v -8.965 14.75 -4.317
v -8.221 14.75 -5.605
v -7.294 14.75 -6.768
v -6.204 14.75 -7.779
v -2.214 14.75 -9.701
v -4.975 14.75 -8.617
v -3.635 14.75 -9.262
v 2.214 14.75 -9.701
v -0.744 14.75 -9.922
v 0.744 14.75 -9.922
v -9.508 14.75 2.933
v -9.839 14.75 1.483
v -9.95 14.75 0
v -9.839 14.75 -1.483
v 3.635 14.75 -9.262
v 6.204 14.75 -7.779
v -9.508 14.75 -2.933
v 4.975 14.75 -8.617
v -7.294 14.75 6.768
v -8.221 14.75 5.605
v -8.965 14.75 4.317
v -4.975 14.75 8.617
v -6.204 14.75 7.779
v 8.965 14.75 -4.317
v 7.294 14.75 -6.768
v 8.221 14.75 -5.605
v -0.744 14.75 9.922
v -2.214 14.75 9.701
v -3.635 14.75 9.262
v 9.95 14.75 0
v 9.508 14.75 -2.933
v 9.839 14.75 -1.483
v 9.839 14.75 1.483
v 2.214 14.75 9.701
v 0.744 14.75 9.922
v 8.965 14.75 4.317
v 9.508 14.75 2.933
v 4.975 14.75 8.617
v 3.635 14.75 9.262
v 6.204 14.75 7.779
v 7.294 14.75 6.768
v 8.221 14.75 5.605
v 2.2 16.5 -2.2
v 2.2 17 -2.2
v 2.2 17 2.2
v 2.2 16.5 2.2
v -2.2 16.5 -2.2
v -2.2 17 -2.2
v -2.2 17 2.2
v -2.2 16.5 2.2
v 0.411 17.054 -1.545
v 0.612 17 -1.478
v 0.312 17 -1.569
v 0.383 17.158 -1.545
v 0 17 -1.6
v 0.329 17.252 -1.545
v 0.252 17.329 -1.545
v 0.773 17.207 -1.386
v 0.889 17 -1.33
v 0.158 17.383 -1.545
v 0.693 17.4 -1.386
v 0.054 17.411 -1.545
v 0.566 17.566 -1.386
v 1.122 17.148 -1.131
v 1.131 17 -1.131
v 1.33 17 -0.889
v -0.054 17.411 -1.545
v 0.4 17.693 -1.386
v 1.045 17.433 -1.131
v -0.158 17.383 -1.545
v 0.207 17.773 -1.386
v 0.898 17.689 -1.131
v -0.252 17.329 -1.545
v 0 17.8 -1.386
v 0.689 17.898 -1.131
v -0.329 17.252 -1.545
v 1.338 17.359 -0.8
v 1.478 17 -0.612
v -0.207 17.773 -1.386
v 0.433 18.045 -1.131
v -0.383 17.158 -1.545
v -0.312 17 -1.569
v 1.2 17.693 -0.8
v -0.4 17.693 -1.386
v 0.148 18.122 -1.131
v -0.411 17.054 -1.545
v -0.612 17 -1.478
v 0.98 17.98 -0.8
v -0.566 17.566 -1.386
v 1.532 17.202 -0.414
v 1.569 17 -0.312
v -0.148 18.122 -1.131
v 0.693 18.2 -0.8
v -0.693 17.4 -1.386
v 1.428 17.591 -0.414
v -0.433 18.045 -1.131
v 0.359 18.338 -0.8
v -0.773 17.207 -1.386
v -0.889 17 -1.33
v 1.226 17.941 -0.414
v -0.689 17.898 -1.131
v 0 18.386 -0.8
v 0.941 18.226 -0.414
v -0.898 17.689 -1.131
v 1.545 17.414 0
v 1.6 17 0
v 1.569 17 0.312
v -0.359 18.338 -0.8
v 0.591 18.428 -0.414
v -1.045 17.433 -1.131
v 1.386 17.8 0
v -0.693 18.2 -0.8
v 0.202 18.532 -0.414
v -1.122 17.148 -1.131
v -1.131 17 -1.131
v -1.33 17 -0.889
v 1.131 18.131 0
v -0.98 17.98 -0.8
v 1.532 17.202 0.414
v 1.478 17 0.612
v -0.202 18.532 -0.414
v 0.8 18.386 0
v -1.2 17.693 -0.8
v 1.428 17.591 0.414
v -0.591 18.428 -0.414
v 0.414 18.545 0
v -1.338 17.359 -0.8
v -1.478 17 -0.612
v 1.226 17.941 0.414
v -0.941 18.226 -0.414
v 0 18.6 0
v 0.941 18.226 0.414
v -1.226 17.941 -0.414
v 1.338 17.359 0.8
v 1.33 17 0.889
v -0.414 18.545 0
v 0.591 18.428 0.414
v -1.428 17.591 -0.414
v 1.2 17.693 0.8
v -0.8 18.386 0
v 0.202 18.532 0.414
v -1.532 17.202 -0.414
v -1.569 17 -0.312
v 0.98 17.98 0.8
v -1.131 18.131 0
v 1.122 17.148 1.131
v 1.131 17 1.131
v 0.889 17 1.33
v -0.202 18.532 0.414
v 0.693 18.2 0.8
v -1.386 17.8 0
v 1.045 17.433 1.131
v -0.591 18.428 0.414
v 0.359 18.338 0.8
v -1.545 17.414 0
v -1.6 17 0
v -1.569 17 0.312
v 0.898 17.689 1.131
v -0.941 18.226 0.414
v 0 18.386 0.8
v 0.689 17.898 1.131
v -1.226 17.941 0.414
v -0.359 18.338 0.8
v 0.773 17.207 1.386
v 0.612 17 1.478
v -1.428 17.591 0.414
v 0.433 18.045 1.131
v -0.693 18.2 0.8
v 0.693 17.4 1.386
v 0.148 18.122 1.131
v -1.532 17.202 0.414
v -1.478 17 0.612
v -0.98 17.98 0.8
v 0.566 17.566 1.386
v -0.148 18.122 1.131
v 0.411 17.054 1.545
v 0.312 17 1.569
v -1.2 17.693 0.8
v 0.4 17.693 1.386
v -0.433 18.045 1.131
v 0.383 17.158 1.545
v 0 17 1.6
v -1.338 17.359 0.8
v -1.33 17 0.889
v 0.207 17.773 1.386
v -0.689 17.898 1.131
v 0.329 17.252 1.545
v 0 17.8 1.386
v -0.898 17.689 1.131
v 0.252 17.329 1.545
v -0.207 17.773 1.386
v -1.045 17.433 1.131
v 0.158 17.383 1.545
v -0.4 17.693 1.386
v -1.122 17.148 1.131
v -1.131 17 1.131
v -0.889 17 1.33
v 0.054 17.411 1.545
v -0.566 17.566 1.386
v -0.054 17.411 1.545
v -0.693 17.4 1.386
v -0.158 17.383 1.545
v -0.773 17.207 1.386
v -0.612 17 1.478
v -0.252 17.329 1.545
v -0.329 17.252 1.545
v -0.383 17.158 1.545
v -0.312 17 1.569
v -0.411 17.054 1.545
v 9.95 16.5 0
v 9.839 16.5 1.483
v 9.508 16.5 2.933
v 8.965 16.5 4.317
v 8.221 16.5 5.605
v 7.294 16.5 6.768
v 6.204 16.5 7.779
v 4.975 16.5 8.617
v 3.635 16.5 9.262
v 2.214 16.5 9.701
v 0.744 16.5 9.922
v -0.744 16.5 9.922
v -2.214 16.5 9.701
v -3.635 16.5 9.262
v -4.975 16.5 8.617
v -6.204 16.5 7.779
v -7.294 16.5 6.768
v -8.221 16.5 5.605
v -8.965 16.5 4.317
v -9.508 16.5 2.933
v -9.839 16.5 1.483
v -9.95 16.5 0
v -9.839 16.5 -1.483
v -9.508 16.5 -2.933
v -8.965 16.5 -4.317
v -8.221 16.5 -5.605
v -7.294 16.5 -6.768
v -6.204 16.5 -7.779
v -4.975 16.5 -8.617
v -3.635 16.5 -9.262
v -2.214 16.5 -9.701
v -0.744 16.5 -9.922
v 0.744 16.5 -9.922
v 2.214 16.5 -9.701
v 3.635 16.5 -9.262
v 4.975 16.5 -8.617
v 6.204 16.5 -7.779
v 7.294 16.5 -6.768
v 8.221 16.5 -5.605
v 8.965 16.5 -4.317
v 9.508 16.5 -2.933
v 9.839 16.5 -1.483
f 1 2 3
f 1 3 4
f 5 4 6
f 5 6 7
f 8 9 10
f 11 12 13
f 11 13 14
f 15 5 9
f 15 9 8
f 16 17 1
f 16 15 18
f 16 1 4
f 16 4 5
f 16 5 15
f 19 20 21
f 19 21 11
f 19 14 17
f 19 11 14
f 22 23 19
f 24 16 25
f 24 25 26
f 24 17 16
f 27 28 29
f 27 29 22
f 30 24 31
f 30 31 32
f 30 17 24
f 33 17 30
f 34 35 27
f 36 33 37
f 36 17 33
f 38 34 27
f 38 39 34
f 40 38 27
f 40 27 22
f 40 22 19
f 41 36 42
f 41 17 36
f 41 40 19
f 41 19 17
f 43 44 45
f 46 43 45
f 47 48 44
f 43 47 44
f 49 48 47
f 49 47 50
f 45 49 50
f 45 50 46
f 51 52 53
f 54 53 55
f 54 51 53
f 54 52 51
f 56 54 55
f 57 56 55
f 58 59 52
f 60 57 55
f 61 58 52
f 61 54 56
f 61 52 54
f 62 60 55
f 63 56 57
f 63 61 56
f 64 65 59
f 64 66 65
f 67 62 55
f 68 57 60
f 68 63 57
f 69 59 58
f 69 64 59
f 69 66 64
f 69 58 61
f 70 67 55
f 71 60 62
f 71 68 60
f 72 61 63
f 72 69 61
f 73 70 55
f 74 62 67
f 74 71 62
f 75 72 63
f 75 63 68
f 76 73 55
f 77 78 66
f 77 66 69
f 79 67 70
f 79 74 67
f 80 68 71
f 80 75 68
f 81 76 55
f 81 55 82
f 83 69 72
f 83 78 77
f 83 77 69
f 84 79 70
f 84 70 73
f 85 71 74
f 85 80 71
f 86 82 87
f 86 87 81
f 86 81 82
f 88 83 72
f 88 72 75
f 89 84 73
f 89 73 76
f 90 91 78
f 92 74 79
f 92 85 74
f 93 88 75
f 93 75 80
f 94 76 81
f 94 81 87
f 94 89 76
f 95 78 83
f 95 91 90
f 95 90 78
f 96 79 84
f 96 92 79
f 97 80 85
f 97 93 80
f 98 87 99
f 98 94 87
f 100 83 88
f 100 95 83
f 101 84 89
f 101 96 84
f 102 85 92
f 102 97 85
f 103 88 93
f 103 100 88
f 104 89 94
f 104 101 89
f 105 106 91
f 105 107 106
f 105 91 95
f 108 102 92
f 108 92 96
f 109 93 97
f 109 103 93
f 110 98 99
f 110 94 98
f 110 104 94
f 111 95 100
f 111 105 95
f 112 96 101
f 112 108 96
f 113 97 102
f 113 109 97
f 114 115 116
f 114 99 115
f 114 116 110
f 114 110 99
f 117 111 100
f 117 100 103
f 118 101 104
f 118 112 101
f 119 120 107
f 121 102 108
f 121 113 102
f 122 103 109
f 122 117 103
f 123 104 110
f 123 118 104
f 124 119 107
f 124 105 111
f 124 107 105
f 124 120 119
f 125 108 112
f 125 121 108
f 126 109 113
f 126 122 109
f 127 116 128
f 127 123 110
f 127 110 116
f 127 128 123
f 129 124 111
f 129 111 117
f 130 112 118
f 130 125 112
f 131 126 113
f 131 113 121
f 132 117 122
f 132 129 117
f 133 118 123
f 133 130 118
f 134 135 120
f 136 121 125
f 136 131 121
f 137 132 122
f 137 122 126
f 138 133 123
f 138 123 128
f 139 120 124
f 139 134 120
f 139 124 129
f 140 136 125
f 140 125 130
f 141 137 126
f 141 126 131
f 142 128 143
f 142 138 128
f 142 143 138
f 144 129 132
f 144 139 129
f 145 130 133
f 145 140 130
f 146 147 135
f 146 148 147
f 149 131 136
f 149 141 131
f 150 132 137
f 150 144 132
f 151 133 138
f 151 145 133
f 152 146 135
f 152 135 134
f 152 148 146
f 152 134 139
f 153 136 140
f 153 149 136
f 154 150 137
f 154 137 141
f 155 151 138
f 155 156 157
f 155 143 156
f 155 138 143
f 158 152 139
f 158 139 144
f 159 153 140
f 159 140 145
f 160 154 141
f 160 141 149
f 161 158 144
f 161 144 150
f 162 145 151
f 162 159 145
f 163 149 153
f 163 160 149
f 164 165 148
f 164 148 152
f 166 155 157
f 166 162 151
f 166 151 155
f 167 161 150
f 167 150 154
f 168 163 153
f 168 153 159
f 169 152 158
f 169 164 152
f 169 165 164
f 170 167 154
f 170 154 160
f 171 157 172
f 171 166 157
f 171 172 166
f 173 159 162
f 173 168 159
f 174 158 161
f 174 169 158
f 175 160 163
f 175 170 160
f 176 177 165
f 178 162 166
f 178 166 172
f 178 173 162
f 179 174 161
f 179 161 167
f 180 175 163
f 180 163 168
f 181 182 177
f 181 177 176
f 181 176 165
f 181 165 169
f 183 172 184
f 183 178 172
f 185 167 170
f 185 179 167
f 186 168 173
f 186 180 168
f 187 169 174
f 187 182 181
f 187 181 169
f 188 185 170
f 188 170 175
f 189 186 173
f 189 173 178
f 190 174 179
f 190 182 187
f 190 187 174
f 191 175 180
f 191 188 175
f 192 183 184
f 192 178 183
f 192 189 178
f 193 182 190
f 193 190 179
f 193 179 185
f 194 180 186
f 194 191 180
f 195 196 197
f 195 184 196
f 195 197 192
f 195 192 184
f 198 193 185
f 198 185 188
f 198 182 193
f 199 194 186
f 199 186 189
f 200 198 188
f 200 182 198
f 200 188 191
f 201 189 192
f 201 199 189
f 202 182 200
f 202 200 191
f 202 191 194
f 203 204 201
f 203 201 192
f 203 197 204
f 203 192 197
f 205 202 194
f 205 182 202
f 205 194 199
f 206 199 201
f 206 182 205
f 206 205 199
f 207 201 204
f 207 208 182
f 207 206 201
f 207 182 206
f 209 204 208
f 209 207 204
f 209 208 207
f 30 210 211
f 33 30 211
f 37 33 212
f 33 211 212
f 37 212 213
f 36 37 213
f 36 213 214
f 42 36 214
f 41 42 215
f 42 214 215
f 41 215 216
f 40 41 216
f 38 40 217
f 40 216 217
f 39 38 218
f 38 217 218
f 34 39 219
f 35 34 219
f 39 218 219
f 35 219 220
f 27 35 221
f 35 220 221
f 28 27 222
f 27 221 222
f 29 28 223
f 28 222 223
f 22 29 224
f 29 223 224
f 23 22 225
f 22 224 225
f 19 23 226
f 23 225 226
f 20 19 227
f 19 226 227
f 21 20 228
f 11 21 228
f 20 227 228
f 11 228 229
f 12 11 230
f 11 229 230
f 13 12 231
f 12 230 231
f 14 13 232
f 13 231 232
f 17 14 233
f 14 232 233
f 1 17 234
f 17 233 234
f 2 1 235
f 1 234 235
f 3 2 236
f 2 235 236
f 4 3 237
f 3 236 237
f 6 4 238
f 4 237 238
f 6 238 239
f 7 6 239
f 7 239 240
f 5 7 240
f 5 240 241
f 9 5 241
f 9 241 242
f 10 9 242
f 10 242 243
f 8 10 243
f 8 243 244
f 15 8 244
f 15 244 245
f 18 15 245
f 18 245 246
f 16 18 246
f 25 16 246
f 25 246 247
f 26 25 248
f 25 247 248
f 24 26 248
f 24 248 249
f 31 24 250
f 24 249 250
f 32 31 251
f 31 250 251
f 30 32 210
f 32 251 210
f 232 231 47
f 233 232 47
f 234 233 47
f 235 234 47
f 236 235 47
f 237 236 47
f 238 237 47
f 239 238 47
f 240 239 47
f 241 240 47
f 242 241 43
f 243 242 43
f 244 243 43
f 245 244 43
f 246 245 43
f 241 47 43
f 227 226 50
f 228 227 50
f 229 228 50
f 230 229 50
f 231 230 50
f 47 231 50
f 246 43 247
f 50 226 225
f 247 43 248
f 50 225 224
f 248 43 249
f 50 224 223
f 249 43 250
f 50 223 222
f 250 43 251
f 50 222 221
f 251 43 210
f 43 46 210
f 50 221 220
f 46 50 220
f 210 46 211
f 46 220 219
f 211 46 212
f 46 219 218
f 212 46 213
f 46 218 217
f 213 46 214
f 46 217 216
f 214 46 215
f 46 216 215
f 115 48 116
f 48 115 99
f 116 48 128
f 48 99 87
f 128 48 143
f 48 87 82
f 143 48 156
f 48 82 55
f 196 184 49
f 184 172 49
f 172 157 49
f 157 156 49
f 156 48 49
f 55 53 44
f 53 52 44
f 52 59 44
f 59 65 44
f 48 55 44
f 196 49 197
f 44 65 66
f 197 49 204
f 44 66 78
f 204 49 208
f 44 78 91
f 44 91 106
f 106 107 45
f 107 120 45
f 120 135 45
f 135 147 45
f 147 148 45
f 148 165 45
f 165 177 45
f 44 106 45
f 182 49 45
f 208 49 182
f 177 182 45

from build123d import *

# Parameters (mm, degrees)
SKETCH060_W  = 4.4
SKETCH060_H  = 4.4
PAD060_DEPTH = 0.5
SKETCH061_R  = 9.95
PAD061_DEPTH = 1.75
SKETCH059_W  = 5
SKETCH059_H  = 5
PAD059_DEPTH = 5


with BuildPart() as body059:
    # Sketch060 → Pad060 (new body)
    with BuildSketch(Plane.XZ):
        with Locations((2.2, -2.2)):
            Rectangle(SKETCH060_W, SKETCH060_H)
    extrude(amount=PAD060_DEPTH)


with BuildPart() as body059_1:
    # Body059 placement: moved
    add(body059.part.moved(Location((-2.2, 0, 2.2))))


with BuildPart() as body060:
    # Sketch061 → Pad061 (new body)
    with BuildSketch(Plane.XZ):
        Circle(SKETCH061_R)
    extrude(amount=PAD061_DEPTH)


with BuildPart() as body060_1:
    # Body060 placement: moved
    add(body060.part.moved(Location((0, -0.5, 0))))


with BuildPart() as body058:
    # Sketch059 → Pad059 (new body)
    with BuildSketch(Plane.XZ):
        with Locations((2.5, -2.5)):
            Rectangle(SKETCH059_W, SKETCH059_H)
    extrude(amount=PAD059_DEPTH)


with BuildPart() as body058_1:
    # Body058 placement: moved
    add(body058.part.moved(Location((-2, 0, 2))))


with BuildPart() as ledsimple:
    # Sphere → Sphere (revolve)
    with BuildSketch(Plane.XZ):
        with BuildLine():
            ThreePointArc((0, -1.6), (1.6, 0), (0, 1.6))
            Line((0, 1.6), (0, -1.6))
        make_face()
    revolve(axis=Axis((0, 0, 0), (0, 0, 1)))

    # Cut063: cut Body058
    add(body058_1.part, mode=Mode.SUBTRACT)

    # Fusion004: union Body059, Body060
    add(body059_1.part)
    add(body060_1.part)


with BuildPart() as ledsimple_1:
    # Fusion004 placement: moved
    add(ledsimple.part.moved(Location((0, 17, 0))))


solid = ledsimple_1.part
